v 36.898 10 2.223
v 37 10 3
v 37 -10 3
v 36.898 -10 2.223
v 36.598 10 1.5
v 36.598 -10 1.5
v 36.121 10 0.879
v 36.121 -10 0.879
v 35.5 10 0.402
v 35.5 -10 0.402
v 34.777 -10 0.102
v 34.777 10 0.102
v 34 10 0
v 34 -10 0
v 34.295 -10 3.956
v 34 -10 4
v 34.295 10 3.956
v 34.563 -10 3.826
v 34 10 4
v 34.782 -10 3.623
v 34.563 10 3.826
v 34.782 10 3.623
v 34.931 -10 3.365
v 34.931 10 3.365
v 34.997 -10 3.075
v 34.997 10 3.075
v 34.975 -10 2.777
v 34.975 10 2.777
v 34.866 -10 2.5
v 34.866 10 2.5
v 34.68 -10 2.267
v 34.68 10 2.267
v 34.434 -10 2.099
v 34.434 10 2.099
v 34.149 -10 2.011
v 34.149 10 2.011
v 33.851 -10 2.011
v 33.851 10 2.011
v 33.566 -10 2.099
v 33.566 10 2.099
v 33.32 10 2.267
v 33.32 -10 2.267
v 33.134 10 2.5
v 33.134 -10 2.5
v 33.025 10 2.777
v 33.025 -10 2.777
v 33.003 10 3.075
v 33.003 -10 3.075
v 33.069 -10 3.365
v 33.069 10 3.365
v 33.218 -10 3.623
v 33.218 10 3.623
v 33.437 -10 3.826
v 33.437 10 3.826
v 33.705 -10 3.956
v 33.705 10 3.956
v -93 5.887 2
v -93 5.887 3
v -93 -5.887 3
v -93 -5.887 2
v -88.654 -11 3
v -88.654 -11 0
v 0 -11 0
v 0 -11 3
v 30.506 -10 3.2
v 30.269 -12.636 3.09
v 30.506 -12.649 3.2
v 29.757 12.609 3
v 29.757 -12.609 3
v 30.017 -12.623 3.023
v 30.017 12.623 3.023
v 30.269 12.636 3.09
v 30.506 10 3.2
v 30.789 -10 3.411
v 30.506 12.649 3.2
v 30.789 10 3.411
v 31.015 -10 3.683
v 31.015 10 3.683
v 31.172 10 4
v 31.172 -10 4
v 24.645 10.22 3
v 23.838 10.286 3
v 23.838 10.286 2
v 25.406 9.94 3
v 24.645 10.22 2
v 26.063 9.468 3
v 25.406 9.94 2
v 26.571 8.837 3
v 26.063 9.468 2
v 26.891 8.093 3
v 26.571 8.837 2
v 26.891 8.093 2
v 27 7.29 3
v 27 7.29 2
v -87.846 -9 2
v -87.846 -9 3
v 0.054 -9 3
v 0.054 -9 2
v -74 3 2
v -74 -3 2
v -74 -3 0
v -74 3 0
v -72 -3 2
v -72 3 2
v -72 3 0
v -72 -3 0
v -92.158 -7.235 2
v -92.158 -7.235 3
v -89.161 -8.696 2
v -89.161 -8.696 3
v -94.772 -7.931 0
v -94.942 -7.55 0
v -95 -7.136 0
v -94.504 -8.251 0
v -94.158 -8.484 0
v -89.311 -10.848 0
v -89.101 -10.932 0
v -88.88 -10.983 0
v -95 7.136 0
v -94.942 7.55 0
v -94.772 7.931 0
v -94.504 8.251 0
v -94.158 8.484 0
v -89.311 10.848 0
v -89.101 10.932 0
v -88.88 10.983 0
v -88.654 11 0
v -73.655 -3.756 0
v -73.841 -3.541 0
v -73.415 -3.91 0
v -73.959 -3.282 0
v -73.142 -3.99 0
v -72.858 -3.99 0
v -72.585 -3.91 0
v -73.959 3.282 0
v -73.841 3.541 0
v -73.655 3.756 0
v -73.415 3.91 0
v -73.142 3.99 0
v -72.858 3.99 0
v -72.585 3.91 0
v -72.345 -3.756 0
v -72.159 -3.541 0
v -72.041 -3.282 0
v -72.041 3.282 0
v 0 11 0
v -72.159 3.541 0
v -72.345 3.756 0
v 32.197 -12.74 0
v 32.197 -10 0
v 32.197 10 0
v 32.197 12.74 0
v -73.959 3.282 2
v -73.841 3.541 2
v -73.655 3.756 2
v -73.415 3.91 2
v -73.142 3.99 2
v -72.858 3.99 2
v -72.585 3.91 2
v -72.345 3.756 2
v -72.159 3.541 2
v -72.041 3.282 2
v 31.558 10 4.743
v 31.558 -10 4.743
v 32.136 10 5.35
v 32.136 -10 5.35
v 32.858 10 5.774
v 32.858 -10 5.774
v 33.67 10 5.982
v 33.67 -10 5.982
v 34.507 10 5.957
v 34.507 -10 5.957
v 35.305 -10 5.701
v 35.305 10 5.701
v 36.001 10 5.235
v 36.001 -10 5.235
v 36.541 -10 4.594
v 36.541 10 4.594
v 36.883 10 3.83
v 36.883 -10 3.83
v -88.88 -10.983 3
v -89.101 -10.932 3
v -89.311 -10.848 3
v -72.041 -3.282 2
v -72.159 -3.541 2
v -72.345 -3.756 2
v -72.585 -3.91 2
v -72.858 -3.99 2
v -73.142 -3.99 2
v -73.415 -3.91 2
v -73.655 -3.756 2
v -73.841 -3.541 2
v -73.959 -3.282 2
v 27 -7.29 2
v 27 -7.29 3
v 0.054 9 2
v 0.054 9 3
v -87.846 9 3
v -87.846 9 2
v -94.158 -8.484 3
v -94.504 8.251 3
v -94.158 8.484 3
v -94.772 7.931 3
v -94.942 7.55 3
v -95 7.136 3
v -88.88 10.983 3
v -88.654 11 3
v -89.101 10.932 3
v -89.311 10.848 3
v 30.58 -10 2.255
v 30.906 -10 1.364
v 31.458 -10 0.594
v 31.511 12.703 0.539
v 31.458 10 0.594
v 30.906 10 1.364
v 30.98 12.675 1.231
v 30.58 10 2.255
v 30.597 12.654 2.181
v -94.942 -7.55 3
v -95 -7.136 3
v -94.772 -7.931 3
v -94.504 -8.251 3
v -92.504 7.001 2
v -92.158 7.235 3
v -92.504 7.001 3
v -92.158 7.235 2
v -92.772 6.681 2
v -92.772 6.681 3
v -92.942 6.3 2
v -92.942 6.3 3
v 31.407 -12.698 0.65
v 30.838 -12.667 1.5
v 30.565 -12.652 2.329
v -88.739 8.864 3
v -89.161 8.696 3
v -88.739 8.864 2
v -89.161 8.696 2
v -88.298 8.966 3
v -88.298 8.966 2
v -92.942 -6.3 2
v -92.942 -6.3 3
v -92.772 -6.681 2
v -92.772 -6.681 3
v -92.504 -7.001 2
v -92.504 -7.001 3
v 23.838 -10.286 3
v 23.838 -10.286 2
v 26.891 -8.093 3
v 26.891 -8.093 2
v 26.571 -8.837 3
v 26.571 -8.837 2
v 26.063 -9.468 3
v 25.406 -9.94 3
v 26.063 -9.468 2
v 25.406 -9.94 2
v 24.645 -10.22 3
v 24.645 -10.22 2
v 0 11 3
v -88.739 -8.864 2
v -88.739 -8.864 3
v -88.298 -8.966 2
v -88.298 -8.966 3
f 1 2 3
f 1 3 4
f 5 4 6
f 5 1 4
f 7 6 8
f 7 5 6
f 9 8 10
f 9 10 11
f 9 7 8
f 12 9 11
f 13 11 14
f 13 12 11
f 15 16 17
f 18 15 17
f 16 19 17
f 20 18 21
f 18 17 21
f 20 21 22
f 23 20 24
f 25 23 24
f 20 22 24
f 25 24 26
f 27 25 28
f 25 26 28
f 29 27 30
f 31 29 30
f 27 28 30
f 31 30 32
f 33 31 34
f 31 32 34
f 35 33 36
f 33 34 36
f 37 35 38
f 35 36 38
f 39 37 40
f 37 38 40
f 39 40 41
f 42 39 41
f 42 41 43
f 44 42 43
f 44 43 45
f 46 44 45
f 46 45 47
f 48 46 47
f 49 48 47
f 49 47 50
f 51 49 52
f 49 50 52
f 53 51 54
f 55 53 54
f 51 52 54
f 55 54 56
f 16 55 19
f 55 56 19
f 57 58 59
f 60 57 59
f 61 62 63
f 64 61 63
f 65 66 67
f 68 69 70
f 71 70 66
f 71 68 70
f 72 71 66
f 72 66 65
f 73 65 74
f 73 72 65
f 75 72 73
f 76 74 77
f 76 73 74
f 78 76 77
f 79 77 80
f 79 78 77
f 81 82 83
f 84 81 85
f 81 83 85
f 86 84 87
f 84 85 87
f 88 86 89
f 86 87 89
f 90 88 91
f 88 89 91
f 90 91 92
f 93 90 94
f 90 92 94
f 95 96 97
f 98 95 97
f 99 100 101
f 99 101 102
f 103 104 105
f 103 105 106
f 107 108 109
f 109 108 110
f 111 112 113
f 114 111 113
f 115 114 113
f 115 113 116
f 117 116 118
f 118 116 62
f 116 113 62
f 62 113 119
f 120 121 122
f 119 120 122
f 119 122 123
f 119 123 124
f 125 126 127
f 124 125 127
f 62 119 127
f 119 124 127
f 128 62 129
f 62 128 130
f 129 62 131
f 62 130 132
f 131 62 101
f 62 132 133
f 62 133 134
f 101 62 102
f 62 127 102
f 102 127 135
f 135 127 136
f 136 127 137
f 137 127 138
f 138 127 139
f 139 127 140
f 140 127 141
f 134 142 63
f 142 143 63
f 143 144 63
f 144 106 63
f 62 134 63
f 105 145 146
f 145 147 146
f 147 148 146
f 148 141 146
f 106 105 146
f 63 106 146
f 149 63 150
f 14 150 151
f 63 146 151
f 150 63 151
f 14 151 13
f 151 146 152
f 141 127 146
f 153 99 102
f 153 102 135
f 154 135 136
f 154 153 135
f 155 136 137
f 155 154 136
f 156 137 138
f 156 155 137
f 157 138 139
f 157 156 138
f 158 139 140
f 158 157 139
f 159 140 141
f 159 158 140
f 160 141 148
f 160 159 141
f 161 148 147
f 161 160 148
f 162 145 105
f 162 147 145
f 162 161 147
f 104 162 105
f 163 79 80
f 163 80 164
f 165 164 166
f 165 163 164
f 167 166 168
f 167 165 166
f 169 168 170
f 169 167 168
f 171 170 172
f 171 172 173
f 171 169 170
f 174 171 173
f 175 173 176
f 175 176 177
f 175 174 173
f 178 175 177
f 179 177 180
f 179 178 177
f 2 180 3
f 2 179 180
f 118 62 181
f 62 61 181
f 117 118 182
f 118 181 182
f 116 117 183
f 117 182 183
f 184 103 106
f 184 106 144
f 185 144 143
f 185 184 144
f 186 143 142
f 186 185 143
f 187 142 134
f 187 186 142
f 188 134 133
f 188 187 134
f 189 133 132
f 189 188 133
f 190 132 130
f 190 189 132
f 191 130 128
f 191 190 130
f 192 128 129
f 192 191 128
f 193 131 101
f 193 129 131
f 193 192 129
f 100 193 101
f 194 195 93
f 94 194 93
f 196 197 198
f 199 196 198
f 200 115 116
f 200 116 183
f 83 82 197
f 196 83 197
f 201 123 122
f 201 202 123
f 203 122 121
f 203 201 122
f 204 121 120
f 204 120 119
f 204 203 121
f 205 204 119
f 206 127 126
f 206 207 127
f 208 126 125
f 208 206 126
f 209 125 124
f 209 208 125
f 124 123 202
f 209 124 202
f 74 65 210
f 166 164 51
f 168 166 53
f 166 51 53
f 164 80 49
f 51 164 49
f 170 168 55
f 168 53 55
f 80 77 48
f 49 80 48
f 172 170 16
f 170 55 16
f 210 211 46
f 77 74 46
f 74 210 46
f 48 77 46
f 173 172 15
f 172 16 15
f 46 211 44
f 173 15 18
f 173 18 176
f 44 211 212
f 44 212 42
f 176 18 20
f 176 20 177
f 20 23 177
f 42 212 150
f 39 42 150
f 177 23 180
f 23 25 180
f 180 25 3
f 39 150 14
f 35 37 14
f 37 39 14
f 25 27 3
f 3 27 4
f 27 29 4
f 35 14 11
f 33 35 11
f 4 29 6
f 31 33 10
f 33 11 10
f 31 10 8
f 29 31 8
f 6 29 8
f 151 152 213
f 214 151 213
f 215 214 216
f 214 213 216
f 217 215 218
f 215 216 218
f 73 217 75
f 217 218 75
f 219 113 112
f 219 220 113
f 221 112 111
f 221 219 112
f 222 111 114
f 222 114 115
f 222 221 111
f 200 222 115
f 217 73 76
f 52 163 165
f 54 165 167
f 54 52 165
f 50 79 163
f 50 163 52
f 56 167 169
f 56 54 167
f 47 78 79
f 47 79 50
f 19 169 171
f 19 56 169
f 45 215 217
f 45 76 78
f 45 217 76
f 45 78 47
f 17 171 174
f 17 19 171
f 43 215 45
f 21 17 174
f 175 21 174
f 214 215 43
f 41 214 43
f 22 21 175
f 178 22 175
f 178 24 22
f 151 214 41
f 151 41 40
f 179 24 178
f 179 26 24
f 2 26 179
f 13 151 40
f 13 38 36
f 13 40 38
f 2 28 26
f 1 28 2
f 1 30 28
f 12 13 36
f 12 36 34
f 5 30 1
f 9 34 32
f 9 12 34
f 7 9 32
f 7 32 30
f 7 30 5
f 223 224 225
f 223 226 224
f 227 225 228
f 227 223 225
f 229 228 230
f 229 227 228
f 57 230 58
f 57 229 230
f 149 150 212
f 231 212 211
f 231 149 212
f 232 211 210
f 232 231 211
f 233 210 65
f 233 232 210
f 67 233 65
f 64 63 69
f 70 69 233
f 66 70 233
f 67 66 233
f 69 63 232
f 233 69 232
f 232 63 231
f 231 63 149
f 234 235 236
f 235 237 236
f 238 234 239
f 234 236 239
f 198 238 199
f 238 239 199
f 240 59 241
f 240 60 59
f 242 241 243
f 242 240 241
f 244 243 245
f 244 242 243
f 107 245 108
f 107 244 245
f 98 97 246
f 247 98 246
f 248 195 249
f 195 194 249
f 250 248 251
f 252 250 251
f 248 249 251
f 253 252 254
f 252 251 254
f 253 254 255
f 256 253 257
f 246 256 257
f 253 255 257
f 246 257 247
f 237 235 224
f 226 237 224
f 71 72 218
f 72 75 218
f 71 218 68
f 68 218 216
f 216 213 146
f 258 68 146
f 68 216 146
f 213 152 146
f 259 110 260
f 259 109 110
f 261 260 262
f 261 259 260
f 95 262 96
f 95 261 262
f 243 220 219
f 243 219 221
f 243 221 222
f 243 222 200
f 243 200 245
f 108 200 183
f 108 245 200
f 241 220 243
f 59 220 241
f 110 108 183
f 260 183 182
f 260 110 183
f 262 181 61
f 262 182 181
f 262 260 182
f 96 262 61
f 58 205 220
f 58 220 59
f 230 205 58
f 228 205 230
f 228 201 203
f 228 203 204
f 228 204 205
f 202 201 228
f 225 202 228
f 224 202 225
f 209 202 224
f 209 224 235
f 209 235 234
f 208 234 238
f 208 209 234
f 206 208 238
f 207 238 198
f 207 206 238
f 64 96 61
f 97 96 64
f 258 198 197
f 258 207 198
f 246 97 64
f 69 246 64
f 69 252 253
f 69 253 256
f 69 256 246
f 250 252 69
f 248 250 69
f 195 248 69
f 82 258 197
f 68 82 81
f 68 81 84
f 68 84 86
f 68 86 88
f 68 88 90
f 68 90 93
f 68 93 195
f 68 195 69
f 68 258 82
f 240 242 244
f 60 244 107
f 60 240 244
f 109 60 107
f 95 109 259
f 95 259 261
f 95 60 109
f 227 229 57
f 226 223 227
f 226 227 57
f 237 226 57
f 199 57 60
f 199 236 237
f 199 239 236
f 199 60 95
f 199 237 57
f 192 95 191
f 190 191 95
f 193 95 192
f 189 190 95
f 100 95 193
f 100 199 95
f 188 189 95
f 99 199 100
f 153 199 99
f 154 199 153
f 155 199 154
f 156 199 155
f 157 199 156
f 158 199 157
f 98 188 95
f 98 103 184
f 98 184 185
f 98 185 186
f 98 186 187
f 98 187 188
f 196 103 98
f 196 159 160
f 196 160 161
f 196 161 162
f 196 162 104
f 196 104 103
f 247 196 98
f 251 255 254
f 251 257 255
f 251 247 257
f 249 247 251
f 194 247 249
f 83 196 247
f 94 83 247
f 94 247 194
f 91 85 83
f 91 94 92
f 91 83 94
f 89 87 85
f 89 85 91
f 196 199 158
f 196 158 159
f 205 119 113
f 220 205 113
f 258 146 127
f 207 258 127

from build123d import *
from OCP.BRepFilletAPI import BRepFilletAPI_MakeChamfer, BRepFilletAPI_MakeFillet

# Parameters (mm, degrees)
SALIENTE_EXTRUIR1_DEPTH = 3
CHAFL_N1_SIZE           = 6
CHAFL_N1_SIZE2          = 2.926395531
CORTAR_EXTRUIR1_DEPTH   = 1
CROQUIS8_R              = 3
SALIENTE_EXTRUIR2_DEPTH = 12.5
REDONDEO1_R             = 3
CROQUIS9_R              = 3.5
CORTAR_EXTRUIR3_DEPTH   = 3
REDONDEO2_R             = 1.5
CROQUIS10_R             = 1
CORTAR_EXTRUIR4_DEPTH   = 15
CORTAR_EXTRUIR5_DEPTH   = 96.933922834
REDONDEO3_R1            = 3
REDONDEO3_R2            = 1.5
REDONDEO4_R             = 1.5


with BuildPart() as part:
    # Croquis1 → Saliente-Extruir1 (new body)
    with BuildSketch(Plane.XY):
        Polygon((0, 11), (-95, 11), (-95, -11), (0, -11), (37, -13), (37, 13), align=None)
    extrude(amount=SALIENTE_EXTRUIR1_DEPTH)

    # Chaflán1: one chamfer whose edges measure the first distance from different faces: ONE call of the kernel's chamfer builder (chamfer() names one face for all edges)
    chafl_n1_edges_1 = [part.edges().sort_by_distance(p)[0] for p in [
        (-95, 11, 1.5),
    ]]
    chafl_n1_side_1 = [part.faces().sort_by_distance(p)[0] for p in [
        (-47.5, 11, 1.5),
    ]]
    chafl_n1_edges_2 = [part.edges().sort_by_distance(p)[0] for p in [
        (-95, -11, 1.5),
    ]]
    chafl_n1_side_2 = [part.faces().sort_by_distance(p)[0] for p in [
        (-47.5, -11, 1.5),
    ]]
    chafl_n1 = BRepFilletAPI_MakeChamfer(part.part.solid().wrapped)
    for e in chafl_n1_edges_1:
        chafl_n1.Add(CHAFL_N1_SIZE, CHAFL_N1_SIZE2, e.wrapped, chafl_n1_side_1[0].wrapped)  # the first distance lies on this face
    for e in chafl_n1_edges_2:
        chafl_n1.Add(CHAFL_N1_SIZE, CHAFL_N1_SIZE2, e.wrapped, chafl_n1_side_2[0].wrapped)  # the first distance lies on this face
    add(Compound.cast(chafl_n1.Shape()), mode=Mode.REPLACE)

    # Croquis7 → Cortar-Extruir1 (cut)
    with BuildSketch(Plane.XY.offset(3)):
        Polygon((-88.538263618, 9), (-93, 6.823865765), (-93, 0), (27, 0), (27, 10.45653975), (0.054014627, 9), align=None)
        Polygon((27, 0), (-93, 0), (-93, -6.823865765), (-88.538263618, -9), (0.054014627, -9), (27, -10.45653975), align=None)
    extrude(amount=-CORTAR_EXTRUIR1_DEPTH, mode=Mode.SUBTRACT)

    # Croquis8 → Saliente-Extruir2 (add, symmetric)
    with BuildSketch(Plane(origin=(0, 0, 0), x_dir=(1, 0, 0), z_dir=(0, 1, 0))):
        with Locations((34, -3)):
            Circle(CROQUIS8_R)
    extrude(amount=SALIENTE_EXTRUIR2_DEPTH, both=True)

    # Redondeo1
    redondeo1_edges = [part.edges().sort_by_distance(p)[0] for p in [
        (37, 0, 0),
    ]]
    fillet(redondeo1_edges, radius=REDONDEO1_R - 0.0001)  # a hair under: the kernel refuses the full size

    # Croquis9 → Cortar-Extruir3 (cut)
    with BuildSketch(Plane(origin=(0, -13, 0), x_dir=(1, 0, 0), z_dir=(0, 1, 0))):
        with Locations((34, -3)):
            Circle(CROQUIS9_R)
    cortar_extruir3 = extrude(amount=CORTAR_EXTRUIR3_DEPTH, mode=Mode.SUBTRACT)

    # Simetría1: Cortar-Extruir3 across plane
    add(cortar_extruir3.mirror(Plane.ZX), mode=Mode.SUBTRACT)

    # Redondeo2
    redondeo2_edges = [part.edges().sort_by_distance(p)[0] for p in [
        (31, 0, 3),
    ]]
    fillet(redondeo2_edges, radius=REDONDEO2_R)

    # Croquis10 → Cortar-Extruir4 (cut, symmetric)
    with BuildSketch(Plane(origin=(0, 0, 0), x_dir=(1, 0, 0), z_dir=(0, 1, 0))):
        with Locations(Location((34, -3, 0), (0, 0, 270))):
            Circle(CROQUIS10_R)
    extrude(amount=CORTAR_EXTRUIR4_DEPTH, both=True, mode=Mode.SUBTRACT)

    # Croquis11 → Cortar-Extruir5 (cut, through all)
    with BuildSketch(Plane.XY.offset(2)):
        with BuildLine():
            Line((-74, -3), (-74, 3))
            ThreePointArc((-74, 3), (-73, 4), (-72, 3))
            Line((-72, 3), (-72, -3))
            ThreePointArc((-72, -3), (-73, -4), (-74, -3))
        make_face()
    extrude(amount=-CORTAR_EXTRUIR5_DEPTH, mode=Mode.SUBTRACT)

    # Redondeo3: one fillet with a radius per group of edges: ONE call of the kernel's fillet builder (fillet() takes one radius for all edges)
    redondeo3_edges_1 = [part.edges().sort_by_distance(p)[0] for p in [
        (27, 10.45653975, 2.5),
        (27, -10.45653975, 2.5),
        (-88.538263618, 9, 2.5),
        (-88.538263618, -9, 2.5),
    ]]
    redondeo3_edges_2 = [part.edges().sort_by_distance(p)[0] for p in [
        (-93, 6.823865765, 2.5),
        (-93, -6.823865765, 2.5),
    ]]
    redondeo3 = BRepFilletAPI_MakeFillet(part.part.solid().wrapped)
    for e in redondeo3_edges_1:
        redondeo3.Add(REDONDEO3_R1, e.wrapped)
    for e in redondeo3_edges_2:
        redondeo3.Add(REDONDEO3_R2, e.wrapped)
    add(Compound.cast(redondeo3.Shape()), mode=Mode.REPLACE)

    # Redondeo4
    redondeo4_edges = [part.edges().sort_by_distance(p)[0] for p in [
        (0, 11, 1.5),
        (0, -11, 1.5),
        (-89, -11, 1.5),
        (-95, 8.073604469, 1.5),
        (-95, -8.073604469, 1.5),
        (-89, 11, 1.5),
    ]]
    fillet(redondeo4_edges, radius=REDONDEO4_R)


solid = part.part
